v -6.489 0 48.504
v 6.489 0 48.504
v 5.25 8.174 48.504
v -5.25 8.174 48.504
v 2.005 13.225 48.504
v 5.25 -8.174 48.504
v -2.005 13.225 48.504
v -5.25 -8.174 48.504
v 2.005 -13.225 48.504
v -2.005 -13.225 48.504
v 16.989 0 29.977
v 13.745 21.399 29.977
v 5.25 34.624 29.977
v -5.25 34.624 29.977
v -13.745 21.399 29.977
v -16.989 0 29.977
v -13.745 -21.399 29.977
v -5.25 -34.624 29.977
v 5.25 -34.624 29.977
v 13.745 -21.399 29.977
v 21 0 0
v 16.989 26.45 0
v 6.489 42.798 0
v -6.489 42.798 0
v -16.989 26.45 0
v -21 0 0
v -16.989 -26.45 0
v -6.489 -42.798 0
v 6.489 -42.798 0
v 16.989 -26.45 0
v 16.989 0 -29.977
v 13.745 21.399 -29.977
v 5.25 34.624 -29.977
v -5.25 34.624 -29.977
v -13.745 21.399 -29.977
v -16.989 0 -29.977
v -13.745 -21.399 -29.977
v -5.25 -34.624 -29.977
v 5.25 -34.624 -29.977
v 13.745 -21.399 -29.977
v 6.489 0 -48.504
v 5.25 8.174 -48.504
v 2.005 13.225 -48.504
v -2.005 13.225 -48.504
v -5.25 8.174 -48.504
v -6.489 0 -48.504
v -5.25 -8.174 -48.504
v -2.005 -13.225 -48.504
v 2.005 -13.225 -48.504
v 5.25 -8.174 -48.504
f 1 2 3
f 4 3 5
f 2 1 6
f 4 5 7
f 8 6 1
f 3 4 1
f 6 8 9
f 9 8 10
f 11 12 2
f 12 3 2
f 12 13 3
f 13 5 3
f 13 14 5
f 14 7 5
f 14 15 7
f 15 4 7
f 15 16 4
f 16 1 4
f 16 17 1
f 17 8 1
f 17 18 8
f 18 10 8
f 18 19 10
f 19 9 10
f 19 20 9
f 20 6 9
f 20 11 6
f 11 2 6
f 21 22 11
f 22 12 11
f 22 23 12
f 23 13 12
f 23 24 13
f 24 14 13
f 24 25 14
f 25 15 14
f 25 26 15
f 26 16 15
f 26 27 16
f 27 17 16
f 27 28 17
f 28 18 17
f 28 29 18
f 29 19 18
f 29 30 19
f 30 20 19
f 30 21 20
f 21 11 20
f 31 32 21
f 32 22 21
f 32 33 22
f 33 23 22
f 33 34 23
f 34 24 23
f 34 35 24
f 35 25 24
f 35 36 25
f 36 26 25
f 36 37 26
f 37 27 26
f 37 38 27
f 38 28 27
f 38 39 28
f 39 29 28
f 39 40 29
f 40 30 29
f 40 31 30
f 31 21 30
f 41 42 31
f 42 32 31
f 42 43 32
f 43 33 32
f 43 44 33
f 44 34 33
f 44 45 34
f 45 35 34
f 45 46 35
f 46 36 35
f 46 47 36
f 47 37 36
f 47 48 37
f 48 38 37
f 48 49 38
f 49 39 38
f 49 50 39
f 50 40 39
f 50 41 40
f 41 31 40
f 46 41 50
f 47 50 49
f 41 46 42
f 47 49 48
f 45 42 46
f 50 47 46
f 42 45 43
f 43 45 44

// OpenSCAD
// Generated by SolidPython 1.0.1 on 2020-07-29 00:46:48


scale(v = [7, 15, 17]) {
	sphere(r = 3);
}
/***********************************************
*********      SolidPython code:      **********
************************************************
 
# import packages: SolidPython
from solid import *
from solid.utils import *
from itertools import chain, combinations, permutations


class Resize:

    def __init__(self, scad_file):
        self.scad_file = scad_file
        #self.scad_file = import_scad(scad_file)
        # cone/cylinder param:
        self.r1 = 0
        self.r2 = 0
        self.h = 0
        # rectangular prism param:
        self.w = 0
        self.l = 0
        # ellipse param:
        self.r = 0

    # import OpenScad code (file name corresponds to shape)


    # classify shape + parameters
    def assign(self, param1, param2, param3):
        if self.scad_file == 'cone.scad':
            self.r1 = param1
            self.r2 = param2
            self.h = param3
        elif self.scad_file == 'cylinder.scad':
            self.r1 = param1
            self.r2 = param2
            self.h = param3
        elif self.scad_file == 'rectangularPrism.scad':
            self.h = param1
            self.l = param2
            self.w = param3
        else:
            self.r = param1
            self.h = param2

    # resize parameters
    def iterate(self):
        x = range(3, 20, 2)
        i = 1
        if self.scad_file == 'cone.scad':
            tempList = list(permutations(x, 2))
            for temp in tempList:
                param1 = temp[0]
                param2 = temp[1]
                filepath = 'produced_scad_files/' + 'cone' + str(param1) + '_' + str(param2) + '_' + '.scad'
                scad_render_to_file(cylinder(h=param1, r1=param2, r2=0), filepath)

        elif self.scad_file == 'cylinder.scad':
            tempList = list(permutations(x, 3))
            for temp in tempList:
                param1 = temp[0]
                param2 = temp[1]
                filepath = 'produced_scad_files/' + 'cylinder' + str(param1) + '_' + str(param2) + '_' + '.scad'
                scad_render_to_file(cylinder(h=param1, r1=param2, r2=param2), filepath)

        elif self.scad_file == 'rectangularPrism.scad':
            tempList = list(permutations(x, 3))
            for temp in tempList:
                param1 = temp[0]
                param2 = temp[1]
                param3 = temp[2]
                filepath = 'produced_scad_files/' + 'rectangularPrism' + str(param1) + '_' + str(param2) + '_' + str(
                    param3) + '.scad'
                scad_render_to_file(cube(size=(param1, param2, param3)), filepath)

        elif self.scad_file == 'ellipse.scad':
            tempList = list(permutations(x, 4))
            for temp in tempList:
                param1 = temp[0]
                param2 = temp[1]
                param3 = temp[2]
                param4 = temp[3]
                filepath = 'produced_scad_files/' + 'ellipse' + str(param1) + '_' + str(param2) + '_' + str(param3) + '_' + str(param4) + '.scad'
                scad_render_to_file(scale([param1, param2, param3])(sphere(r=param4)), filepath)

    def render_to_scadfile(self):
        scad_render_to_file(scad, 'example.scad') 
 
************************************************/
